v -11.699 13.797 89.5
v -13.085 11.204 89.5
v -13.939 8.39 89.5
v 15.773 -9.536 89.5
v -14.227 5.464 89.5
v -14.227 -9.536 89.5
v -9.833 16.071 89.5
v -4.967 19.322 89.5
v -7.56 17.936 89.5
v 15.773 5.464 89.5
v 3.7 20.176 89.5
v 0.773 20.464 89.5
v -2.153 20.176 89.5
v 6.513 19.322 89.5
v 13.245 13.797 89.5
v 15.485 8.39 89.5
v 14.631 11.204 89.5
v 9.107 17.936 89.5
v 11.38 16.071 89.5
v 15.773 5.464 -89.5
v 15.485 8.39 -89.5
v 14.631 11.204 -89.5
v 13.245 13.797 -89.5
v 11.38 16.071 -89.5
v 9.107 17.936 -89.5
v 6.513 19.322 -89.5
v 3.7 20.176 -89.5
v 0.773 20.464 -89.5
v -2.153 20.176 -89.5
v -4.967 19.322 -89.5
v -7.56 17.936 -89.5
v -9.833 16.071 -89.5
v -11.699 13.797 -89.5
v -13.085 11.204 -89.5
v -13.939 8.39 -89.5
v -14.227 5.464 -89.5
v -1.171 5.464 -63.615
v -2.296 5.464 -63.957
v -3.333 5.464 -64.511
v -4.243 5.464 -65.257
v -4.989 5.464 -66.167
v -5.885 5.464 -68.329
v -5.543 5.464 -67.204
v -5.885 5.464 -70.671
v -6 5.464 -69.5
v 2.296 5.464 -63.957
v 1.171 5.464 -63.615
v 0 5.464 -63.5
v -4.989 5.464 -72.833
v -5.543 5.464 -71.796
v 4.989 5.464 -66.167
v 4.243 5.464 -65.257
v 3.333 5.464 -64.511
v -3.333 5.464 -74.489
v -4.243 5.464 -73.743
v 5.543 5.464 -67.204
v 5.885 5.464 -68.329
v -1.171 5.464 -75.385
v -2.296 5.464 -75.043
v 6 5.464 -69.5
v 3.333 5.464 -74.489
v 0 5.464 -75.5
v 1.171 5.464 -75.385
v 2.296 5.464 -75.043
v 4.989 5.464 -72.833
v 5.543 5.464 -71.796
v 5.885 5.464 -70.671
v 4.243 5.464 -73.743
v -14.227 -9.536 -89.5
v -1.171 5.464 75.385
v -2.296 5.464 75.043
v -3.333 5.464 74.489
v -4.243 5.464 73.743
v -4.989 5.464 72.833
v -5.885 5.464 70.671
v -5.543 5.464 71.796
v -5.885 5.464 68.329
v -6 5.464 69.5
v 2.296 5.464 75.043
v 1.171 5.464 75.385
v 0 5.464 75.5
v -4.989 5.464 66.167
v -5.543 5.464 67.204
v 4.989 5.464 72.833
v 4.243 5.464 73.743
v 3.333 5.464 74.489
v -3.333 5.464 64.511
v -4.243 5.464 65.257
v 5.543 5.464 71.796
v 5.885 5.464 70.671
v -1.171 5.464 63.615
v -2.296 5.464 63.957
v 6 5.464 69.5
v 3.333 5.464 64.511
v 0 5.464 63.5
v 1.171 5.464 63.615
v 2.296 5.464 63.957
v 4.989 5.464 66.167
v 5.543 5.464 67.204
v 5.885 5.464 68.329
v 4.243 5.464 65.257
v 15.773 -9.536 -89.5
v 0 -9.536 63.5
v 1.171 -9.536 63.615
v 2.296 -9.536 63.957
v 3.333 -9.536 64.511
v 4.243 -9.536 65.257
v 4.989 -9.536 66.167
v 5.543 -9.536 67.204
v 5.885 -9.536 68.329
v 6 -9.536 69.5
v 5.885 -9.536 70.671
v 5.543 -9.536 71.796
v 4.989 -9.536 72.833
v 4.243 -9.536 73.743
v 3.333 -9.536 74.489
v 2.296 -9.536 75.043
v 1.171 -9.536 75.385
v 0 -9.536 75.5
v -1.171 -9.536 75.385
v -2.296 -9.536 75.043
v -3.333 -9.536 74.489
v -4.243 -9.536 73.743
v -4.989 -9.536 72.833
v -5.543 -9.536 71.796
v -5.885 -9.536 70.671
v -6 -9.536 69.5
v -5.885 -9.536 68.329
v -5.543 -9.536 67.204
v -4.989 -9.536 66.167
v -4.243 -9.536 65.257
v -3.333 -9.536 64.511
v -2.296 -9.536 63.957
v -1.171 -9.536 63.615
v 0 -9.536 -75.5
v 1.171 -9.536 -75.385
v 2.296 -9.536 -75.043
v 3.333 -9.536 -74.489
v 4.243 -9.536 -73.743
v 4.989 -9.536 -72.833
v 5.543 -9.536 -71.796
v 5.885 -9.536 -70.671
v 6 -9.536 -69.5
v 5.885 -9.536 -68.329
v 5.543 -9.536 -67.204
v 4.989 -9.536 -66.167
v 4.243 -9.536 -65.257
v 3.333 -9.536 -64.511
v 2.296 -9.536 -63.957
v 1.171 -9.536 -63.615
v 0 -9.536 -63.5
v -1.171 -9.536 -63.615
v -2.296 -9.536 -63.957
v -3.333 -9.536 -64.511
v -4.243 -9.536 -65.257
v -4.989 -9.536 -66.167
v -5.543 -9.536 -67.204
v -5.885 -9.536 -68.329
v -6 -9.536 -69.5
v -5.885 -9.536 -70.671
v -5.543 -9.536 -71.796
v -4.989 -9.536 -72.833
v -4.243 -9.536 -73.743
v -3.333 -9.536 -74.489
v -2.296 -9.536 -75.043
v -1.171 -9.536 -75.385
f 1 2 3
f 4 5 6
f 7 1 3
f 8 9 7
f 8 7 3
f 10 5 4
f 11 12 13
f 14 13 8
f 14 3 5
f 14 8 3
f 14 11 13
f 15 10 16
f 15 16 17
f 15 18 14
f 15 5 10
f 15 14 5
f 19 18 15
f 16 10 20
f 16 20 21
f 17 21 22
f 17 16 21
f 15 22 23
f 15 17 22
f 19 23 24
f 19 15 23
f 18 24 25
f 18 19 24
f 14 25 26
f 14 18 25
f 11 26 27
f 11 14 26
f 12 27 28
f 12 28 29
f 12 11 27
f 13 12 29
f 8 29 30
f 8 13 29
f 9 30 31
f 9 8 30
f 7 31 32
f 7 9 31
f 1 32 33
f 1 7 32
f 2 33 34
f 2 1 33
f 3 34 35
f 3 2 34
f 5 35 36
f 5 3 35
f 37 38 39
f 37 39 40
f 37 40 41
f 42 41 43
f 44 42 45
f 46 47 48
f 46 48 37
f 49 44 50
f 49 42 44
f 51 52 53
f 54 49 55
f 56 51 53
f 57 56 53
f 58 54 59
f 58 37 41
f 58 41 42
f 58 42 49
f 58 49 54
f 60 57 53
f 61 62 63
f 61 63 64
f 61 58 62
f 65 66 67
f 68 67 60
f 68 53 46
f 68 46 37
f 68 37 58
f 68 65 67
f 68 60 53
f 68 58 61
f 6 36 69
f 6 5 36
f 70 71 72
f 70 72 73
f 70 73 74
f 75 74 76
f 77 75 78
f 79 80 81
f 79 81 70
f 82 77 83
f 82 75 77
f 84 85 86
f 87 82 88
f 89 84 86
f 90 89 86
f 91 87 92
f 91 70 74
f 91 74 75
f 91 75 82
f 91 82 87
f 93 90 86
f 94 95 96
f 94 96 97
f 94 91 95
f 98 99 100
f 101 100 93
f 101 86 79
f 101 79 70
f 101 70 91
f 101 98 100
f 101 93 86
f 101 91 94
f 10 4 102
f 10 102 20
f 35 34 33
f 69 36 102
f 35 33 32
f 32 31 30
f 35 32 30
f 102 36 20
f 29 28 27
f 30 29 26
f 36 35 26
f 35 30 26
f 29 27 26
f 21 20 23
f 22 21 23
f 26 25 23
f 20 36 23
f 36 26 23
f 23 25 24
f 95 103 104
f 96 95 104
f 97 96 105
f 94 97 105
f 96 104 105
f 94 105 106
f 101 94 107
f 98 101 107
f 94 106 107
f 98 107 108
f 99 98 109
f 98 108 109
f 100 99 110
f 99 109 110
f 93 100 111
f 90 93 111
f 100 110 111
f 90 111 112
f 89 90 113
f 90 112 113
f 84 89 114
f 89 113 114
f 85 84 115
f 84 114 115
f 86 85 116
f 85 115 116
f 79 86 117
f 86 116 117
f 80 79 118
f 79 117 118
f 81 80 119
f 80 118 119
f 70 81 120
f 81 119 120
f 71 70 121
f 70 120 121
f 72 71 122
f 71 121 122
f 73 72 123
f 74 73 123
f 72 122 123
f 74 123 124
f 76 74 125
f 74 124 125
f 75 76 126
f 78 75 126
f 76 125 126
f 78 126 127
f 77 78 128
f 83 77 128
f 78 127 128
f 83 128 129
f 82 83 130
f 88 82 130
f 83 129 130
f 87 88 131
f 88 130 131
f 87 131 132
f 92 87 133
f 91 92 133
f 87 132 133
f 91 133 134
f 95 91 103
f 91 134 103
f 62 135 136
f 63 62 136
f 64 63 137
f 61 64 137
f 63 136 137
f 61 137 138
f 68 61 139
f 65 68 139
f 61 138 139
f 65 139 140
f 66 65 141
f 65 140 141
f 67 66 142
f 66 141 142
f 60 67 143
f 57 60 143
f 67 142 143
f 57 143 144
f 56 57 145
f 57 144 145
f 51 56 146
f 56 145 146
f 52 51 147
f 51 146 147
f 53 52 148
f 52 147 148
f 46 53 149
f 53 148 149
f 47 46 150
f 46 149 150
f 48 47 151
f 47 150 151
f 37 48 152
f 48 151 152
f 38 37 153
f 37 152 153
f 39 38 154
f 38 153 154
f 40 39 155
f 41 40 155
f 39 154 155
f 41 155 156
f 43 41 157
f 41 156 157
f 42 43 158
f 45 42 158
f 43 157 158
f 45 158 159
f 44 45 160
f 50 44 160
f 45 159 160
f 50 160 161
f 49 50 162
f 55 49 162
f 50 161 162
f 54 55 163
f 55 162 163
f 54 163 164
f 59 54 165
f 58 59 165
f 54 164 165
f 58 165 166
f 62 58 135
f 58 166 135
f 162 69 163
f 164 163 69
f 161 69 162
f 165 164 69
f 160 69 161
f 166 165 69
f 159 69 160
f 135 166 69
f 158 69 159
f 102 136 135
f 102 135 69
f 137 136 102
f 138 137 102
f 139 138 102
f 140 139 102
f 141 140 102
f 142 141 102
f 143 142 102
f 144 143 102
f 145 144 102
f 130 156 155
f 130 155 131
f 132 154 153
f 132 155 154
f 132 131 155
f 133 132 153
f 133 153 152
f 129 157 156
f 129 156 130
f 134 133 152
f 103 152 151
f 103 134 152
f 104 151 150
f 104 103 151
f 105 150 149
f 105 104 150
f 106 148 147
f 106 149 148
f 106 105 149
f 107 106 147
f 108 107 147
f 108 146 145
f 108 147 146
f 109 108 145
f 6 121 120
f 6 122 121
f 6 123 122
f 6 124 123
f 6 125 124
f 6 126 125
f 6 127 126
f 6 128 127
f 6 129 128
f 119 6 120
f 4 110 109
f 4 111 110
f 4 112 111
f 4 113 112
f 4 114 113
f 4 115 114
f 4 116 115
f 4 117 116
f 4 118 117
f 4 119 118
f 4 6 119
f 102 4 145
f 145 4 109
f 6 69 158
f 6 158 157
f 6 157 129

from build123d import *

# Parameters (mm, degrees)
SALIENTE_EXTRUIR1_DEPTH = 89.5
CROQUIS3_R              = 6
CORTAR_EXTRUIR1_DEPTH   = 15


with BuildPart() as part:
    # Croquis2 → Saliente-Extruir1 (new, symmetric)
    with BuildSketch(Plane.XY):
        with BuildLine():
            Line((-14.226804124, -9.536082474), (15.773195876, -9.536082474))
            Line((15.773195876, -9.536082474), (15.773195876, 5.463917526))
            ThreePointArc((15.773195876, 5.463917526), (0.773195876, 20.463917526), (-14.226804124, 5.463917526))
            Line((-14.226804124, 5.463917526), (-14.226804124, -9.536082474))
        make_face()
    extrude(amount=SALIENTE_EXTRUIR1_DEPTH, both=True)

    # Croquis3 → Cortar-Extruir1 (cut)
    with BuildSketch(Plane.XZ.offset(9.536082474)):
        with Locations(Location((0, 69.5, 0), (0, 0, 270))):
            Circle(CROQUIS3_R)
        with Locations(Location((0, -69.5, 0), (0, 0, 270))):
            Circle(CROQUIS3_R)
    extrude(amount=-CORTAR_EXTRUIR1_DEPTH, mode=Mode.SUBTRACT)


solid = part.part
